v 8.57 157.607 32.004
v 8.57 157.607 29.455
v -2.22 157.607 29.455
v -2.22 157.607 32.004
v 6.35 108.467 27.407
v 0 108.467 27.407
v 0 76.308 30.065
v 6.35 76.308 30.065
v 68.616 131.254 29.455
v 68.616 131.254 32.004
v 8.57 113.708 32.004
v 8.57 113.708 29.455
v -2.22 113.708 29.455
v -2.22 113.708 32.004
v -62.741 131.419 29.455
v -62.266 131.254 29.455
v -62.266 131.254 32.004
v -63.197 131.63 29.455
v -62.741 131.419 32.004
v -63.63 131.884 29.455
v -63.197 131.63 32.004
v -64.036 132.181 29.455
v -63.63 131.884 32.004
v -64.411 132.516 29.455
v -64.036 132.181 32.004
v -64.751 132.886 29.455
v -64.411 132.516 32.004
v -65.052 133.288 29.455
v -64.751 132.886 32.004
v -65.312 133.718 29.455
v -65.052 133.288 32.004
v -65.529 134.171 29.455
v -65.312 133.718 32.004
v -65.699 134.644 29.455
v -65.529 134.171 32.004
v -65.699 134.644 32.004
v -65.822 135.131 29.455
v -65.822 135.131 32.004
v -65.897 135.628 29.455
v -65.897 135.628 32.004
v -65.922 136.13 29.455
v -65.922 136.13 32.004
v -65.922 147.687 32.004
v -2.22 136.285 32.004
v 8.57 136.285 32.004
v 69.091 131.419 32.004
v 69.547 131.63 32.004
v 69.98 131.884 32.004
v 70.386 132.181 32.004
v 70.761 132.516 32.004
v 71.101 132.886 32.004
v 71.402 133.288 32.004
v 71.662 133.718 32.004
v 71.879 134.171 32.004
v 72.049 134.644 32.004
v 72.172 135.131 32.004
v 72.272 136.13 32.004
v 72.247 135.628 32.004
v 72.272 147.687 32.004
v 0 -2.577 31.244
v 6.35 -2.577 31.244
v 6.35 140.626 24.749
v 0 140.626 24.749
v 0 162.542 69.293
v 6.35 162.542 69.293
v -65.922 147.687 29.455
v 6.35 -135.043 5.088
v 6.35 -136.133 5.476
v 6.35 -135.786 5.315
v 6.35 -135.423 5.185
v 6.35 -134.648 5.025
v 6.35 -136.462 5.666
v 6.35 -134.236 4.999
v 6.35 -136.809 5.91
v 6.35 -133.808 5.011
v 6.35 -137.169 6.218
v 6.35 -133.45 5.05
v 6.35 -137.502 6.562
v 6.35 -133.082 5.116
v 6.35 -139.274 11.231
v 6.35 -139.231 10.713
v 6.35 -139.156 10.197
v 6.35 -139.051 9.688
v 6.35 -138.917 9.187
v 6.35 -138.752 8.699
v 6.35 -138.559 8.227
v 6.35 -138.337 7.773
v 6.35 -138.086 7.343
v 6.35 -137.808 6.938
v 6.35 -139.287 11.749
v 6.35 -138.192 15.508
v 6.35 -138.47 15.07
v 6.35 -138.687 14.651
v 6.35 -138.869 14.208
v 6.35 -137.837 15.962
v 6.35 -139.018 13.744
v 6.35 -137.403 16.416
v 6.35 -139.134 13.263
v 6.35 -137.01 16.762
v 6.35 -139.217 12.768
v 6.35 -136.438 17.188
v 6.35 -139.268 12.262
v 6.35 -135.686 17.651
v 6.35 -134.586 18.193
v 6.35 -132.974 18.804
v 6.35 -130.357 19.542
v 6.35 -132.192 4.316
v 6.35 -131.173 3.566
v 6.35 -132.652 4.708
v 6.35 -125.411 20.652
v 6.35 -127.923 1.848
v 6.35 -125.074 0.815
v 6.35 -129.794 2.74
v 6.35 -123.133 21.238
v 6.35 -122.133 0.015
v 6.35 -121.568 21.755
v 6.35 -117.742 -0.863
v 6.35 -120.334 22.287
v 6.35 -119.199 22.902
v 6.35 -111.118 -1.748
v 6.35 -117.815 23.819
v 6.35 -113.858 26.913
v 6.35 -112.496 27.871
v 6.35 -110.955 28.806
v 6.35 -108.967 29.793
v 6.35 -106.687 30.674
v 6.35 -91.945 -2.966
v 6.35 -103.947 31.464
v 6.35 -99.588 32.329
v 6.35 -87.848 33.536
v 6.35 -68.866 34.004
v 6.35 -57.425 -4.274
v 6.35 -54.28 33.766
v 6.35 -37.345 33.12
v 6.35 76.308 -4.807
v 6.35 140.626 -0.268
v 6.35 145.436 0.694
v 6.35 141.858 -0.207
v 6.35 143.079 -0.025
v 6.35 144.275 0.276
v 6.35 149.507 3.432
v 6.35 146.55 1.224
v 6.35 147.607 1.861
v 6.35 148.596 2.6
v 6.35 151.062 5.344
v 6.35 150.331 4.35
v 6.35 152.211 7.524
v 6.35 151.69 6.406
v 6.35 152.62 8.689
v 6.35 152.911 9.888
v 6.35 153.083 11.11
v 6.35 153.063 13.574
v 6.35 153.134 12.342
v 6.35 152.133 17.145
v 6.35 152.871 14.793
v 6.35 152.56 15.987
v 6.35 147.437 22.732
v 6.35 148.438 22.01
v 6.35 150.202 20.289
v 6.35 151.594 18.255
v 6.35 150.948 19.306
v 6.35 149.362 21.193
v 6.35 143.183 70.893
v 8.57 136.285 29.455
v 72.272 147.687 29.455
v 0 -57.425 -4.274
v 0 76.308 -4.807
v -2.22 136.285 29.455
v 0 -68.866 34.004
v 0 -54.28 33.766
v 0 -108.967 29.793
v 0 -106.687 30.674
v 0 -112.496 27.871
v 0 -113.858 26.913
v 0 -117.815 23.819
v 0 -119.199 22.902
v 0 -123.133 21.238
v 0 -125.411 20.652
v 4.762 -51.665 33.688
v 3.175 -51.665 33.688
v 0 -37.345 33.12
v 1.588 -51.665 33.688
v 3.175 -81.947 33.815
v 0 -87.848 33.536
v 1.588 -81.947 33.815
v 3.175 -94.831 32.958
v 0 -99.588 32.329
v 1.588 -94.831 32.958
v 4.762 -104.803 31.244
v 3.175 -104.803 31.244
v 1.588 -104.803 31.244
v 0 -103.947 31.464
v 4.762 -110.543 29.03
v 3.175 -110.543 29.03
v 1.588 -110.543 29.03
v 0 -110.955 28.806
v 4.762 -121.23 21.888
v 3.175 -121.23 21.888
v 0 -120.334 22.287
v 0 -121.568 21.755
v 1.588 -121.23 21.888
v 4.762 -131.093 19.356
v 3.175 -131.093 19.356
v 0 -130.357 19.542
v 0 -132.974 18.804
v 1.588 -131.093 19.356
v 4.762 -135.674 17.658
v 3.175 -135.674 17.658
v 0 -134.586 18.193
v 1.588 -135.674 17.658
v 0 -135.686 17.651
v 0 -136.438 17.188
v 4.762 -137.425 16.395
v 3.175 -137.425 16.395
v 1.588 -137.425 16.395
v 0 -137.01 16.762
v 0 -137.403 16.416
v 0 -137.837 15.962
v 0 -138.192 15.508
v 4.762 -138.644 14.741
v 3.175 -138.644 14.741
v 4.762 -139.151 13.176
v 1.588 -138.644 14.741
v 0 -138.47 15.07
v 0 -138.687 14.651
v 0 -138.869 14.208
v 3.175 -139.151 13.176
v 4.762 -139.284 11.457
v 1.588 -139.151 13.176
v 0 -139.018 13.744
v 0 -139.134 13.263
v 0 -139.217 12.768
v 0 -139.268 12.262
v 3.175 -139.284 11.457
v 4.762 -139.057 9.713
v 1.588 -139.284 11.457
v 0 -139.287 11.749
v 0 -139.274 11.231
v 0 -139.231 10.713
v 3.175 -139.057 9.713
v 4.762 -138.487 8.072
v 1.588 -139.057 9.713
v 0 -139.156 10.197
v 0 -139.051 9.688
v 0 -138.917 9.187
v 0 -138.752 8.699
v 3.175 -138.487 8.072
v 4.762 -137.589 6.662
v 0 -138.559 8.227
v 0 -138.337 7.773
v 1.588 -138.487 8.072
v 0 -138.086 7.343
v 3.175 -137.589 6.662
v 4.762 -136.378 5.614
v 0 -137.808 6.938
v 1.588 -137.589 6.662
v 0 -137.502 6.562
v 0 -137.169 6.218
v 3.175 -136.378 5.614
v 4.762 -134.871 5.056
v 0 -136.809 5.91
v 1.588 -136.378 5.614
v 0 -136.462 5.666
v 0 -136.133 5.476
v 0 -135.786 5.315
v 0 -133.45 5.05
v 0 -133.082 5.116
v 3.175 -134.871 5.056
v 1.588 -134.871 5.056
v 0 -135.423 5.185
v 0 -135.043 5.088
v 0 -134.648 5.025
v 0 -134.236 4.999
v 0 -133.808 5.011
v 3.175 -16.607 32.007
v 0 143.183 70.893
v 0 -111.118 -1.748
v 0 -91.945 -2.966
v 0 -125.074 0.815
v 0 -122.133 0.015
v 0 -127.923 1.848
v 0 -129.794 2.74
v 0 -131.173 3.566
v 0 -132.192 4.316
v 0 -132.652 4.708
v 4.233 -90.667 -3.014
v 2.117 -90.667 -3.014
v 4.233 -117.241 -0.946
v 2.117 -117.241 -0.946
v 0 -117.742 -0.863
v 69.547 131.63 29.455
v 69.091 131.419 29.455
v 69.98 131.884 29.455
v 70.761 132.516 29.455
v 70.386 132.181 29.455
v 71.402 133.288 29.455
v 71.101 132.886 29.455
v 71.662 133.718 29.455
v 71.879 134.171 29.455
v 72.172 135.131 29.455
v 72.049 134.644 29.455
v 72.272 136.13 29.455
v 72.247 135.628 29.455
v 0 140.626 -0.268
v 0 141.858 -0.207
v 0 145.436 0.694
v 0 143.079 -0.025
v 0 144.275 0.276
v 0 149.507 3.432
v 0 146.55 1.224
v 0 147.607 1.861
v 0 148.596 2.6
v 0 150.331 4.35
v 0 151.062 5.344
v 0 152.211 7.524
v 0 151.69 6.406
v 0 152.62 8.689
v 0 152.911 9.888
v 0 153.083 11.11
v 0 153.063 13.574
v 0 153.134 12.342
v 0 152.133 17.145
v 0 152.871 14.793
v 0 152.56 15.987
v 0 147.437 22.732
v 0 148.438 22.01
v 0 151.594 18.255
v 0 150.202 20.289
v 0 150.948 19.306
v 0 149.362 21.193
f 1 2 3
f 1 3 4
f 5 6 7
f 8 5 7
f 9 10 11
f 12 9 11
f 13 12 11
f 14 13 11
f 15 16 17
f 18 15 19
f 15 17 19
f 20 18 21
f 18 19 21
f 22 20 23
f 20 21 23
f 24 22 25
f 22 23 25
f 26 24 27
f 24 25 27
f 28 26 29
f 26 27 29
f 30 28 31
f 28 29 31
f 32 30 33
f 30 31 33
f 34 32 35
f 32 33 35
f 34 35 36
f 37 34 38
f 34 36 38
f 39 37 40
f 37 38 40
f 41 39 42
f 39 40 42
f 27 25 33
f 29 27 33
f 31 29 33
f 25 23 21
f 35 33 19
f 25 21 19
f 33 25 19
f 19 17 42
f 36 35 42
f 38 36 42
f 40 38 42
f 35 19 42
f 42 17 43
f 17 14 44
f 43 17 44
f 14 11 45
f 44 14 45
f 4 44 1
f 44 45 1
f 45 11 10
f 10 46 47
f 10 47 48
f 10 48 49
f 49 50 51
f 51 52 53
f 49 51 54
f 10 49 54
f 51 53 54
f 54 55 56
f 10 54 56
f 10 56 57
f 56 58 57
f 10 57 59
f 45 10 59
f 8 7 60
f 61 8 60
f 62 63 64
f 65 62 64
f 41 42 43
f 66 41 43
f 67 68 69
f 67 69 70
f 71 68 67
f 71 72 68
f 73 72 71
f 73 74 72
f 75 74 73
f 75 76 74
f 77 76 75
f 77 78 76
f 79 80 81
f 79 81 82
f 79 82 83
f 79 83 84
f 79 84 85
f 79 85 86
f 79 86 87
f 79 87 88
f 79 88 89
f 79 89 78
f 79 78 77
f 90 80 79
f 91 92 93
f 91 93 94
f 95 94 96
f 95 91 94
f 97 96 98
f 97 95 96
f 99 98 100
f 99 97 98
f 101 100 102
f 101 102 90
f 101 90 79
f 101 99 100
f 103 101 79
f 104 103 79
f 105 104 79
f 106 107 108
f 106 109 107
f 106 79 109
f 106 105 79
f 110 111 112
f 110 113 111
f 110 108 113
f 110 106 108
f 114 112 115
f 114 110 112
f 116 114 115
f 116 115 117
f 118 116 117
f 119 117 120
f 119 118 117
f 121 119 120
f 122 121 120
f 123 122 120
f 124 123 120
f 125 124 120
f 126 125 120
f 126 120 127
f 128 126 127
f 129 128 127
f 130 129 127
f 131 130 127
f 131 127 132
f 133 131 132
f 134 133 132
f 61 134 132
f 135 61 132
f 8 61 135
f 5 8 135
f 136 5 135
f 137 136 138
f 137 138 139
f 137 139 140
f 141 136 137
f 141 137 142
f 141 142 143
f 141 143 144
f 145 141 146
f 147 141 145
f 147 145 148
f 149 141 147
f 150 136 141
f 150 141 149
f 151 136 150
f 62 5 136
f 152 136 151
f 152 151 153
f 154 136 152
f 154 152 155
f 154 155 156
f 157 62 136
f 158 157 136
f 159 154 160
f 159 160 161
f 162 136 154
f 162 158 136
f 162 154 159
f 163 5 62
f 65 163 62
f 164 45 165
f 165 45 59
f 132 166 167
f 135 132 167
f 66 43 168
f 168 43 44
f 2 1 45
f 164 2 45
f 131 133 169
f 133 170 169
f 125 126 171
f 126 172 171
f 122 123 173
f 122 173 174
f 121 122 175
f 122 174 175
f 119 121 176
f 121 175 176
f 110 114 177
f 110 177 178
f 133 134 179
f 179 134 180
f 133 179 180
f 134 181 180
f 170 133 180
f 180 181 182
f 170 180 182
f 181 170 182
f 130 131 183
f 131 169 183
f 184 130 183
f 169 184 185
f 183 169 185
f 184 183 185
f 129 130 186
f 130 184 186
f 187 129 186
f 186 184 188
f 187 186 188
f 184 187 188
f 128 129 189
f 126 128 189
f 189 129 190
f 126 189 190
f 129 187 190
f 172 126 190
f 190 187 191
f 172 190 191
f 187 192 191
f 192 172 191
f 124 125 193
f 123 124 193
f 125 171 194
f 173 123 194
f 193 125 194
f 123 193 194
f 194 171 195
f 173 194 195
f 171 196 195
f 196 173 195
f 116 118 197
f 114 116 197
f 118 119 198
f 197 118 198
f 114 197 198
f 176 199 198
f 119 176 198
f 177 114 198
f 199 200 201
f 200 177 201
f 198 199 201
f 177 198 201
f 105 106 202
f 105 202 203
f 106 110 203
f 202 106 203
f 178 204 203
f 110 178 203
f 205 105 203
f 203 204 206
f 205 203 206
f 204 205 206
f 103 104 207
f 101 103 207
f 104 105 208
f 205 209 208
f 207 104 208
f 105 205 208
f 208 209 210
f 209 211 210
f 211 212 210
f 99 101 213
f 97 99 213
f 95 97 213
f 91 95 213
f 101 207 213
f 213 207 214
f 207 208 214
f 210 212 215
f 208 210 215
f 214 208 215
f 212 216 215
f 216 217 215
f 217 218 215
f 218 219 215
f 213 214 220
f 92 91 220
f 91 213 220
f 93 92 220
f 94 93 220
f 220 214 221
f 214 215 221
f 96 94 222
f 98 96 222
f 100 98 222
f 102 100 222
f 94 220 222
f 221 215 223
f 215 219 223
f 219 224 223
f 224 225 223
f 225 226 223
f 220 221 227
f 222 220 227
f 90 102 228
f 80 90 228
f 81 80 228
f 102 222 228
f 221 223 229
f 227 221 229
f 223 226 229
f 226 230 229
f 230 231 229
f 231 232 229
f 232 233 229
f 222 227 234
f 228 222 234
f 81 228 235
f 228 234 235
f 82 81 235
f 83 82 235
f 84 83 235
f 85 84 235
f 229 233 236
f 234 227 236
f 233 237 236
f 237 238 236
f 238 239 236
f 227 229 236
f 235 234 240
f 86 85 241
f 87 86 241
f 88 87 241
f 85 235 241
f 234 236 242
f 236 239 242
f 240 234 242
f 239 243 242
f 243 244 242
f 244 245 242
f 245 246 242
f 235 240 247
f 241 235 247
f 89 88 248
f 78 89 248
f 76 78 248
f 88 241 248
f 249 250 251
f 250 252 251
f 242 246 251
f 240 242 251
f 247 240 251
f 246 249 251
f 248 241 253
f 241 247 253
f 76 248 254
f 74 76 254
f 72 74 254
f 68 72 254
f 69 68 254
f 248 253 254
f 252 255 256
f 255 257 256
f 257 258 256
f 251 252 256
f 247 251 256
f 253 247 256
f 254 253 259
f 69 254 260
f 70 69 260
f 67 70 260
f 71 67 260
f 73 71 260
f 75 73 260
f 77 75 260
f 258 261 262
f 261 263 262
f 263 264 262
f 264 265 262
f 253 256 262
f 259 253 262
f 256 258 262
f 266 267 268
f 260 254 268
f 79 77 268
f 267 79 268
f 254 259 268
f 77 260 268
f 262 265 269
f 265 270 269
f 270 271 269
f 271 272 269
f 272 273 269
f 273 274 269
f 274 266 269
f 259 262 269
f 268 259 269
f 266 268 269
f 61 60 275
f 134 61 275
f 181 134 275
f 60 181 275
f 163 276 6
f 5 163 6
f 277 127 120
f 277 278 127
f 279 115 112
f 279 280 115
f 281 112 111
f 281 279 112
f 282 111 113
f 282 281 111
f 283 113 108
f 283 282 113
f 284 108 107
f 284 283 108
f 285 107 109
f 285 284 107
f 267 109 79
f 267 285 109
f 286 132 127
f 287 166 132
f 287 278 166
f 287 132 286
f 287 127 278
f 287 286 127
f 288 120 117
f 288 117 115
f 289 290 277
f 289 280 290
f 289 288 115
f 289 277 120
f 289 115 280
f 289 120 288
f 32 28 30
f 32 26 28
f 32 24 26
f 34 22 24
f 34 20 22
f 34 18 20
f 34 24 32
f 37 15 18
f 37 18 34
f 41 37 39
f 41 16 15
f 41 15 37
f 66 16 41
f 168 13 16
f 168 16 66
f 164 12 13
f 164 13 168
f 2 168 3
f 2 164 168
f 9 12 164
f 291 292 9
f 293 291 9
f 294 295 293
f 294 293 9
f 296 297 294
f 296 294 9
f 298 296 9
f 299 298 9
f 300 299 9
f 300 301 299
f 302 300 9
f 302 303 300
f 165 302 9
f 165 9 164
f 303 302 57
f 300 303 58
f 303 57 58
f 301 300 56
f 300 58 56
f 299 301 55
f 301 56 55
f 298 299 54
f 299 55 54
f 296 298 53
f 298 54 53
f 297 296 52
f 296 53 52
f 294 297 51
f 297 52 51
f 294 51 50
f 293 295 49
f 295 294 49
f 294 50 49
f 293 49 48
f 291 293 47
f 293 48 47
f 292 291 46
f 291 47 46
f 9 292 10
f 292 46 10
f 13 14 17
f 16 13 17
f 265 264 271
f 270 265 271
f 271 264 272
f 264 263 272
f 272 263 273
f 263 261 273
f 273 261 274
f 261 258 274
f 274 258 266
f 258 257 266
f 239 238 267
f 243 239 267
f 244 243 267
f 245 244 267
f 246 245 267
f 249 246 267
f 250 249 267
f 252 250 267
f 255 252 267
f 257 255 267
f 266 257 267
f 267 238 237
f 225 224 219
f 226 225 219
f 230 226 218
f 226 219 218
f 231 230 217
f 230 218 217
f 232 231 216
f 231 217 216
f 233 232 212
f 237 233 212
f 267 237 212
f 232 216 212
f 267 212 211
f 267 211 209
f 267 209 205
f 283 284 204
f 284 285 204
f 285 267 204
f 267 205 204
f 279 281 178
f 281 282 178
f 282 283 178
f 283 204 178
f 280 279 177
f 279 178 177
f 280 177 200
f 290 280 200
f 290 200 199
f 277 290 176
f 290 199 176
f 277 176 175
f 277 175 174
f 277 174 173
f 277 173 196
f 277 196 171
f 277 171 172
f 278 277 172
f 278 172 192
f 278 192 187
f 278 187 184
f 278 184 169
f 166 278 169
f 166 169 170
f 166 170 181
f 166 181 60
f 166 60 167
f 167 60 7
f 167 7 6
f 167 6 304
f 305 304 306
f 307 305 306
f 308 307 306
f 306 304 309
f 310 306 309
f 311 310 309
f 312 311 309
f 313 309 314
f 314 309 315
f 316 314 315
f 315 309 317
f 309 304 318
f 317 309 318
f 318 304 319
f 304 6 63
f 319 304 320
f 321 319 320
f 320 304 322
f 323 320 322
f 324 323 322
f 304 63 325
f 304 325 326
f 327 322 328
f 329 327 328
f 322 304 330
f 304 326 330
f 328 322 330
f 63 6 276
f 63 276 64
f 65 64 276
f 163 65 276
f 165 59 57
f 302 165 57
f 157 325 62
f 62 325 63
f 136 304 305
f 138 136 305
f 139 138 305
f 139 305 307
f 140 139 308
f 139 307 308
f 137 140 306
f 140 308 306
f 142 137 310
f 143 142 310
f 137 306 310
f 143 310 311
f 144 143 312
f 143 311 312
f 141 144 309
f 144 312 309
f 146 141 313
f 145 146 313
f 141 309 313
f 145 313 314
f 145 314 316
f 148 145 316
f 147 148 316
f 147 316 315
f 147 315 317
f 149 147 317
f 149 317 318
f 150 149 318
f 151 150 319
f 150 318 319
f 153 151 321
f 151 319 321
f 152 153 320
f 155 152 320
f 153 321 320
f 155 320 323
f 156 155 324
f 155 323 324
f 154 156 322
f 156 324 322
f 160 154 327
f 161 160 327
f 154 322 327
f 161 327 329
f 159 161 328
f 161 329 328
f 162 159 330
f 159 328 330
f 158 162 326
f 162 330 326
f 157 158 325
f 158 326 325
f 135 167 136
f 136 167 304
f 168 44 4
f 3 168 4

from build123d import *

# Parameters (mm, degrees)
F1_DEPTH = 6.35
F2_W     = 43.8992977142
F2_H     = 2.5489926338
F3_DEPTH = 132.08
F5_DEPTH = 25.4


# Not quite as in the source:
# - a feature names something its author has since deleted; it is built from what else it names


with BuildPart() as f1:
    # F0 (on Right) → F1 (new body)
    with BuildSketch(Plane.YZ):
        with BuildLine():
            Line((76.3076053803, 30.0652621201), (-2.577113572, 31.2436707318))
            add(Edge.make_bspline(
                [(-2.577113572, 31.2436707318), (-18.9517831163, 31.8808788266), (-110.584283844, 39.3805456931), (-117.2445348924, 19.5506491484), (-143.4980605313, 19.8314466417), (-138.213646076, 4.0164198283), (-133.0822259188, 5.1160147414)],
                knots=[0, 0, 0, 0, 0.4568495448, 0.6533081411, 0.8493490225, 1, 1, 1, 1], degree=3))
            add(Edge.make_bspline(
                [(-57.4250192094, -4.2738611867), (-92.646561563, -2.3575690575), (-123.9624172449, -4.0037976578), (-133.0822259188, 5.1160147414)],
                knots=[0, 0, 0, 0, 76.2376724265, 76.2376724265, 76.2376724265, 76.2376724265], degree=3))
            Line((-57.4250192094, -4.2738611867), (76.3076053803, -4.8074758588))
            Line((76.3076053803, -4.8074758588), (140.6258685644, -0.2679234478))
            ThreePointArc((140.6258685644, -0.2679234478), (152.6195542591, 8.6888150074), (147.4371024588, 22.732100009))
            Line((147.4371024588, 22.732100009), (140.6258685644, 24.7491808721))
            Line((140.6258685644, 24.7491808721), (162.5416169533, 69.2932593767))
            Line((162.5416169533, 69.2932593767), (143.1825459003, 70.8933398128))
            Line((143.1825459003, 70.8933398128), (108.4667369723, 27.4072214961))
            Line((108.4667369723, 27.4072214961), (76.3076053803, 30.0652621201))
        make_face()
    extrude(amount=F1_DEPTH)


with BuildPart() as f3:
    # F2 (on Right) → F3 (new body, symmetric)
    with BuildSketch(Plane.YZ):
        with Locations((135.6572210789, 30.7295061648)):
            Rectangle(F2_W, F2_H)
    extrude(amount=F3_DEPTH, both=True)

    # F4 (on face) → F5 (cut)
    with BuildSketch(Plane.XY.offset(32.0040024817)):
        with BuildLine():
            Line((68.6163709771, 131.2541425074), (8.5697518662, 113.7075722218))
            Line((8.5697518662, 113.7075722218), (11.151721701, 106.6866666079))
            Line((11.151721701, 106.6866666079), (138.4570300579, 103.6873310804))
            Line((138.4570300579, 103.6873310804), (142.1228945255, 164.6739095449))
            Line((142.1228945255, 164.6739095449), (8.5697518662, 160.3934181468))
            Line((8.5697518662, 160.3934181468), (8.5697518662, 136.2849026918))
            Line((8.5697518662, 136.2849026918), (72.2715035081, 147.6867645979))
            Line((72.2715035081, 147.6867645979), (72.2715035081, 136.1302221516))
            ThreePointArc((72.2715035081, 136.1302221516), (71.256274519, 133.0832504371), (68.6163709771, 131.2541425074))
        make_face()
        with BuildLine():
            Line((-65.9215035081, 147.6867645979), (-2.2197518662, 136.2849026918))
            Line((-2.2197518662, 136.2849026918), (-2.2197518662, 160.3934181468))
            Line((-2.2197518662, 160.3934181468), (-135.7728945255, 164.6739095449))
            Line((-135.7728945255, 164.6739095449), (-132.1070300579, 103.6873310804))
            Line((-132.1070300579, 103.6873310804), (-4.801721701, 106.6866666079))
            Line((-4.801721701, 106.6866666079), (-2.2197518662, 113.7075722218))
            Line((-2.2197518662, 113.7075722218), (-62.2663709771, 131.2541425074))
            ThreePointArc((-62.2663709771, 131.2541425074), (-64.906274519, 133.0832504371), (-65.9215035081, 136.1302221516))
            Line((-65.9215035081, 136.1302221516), (-65.9215035081, 147.6867645979))
        make_face()
    extrude(amount=-F5_DEPTH, mode=Mode.SUBTRACT)


solid = Compound([f1.part, f3.part])
